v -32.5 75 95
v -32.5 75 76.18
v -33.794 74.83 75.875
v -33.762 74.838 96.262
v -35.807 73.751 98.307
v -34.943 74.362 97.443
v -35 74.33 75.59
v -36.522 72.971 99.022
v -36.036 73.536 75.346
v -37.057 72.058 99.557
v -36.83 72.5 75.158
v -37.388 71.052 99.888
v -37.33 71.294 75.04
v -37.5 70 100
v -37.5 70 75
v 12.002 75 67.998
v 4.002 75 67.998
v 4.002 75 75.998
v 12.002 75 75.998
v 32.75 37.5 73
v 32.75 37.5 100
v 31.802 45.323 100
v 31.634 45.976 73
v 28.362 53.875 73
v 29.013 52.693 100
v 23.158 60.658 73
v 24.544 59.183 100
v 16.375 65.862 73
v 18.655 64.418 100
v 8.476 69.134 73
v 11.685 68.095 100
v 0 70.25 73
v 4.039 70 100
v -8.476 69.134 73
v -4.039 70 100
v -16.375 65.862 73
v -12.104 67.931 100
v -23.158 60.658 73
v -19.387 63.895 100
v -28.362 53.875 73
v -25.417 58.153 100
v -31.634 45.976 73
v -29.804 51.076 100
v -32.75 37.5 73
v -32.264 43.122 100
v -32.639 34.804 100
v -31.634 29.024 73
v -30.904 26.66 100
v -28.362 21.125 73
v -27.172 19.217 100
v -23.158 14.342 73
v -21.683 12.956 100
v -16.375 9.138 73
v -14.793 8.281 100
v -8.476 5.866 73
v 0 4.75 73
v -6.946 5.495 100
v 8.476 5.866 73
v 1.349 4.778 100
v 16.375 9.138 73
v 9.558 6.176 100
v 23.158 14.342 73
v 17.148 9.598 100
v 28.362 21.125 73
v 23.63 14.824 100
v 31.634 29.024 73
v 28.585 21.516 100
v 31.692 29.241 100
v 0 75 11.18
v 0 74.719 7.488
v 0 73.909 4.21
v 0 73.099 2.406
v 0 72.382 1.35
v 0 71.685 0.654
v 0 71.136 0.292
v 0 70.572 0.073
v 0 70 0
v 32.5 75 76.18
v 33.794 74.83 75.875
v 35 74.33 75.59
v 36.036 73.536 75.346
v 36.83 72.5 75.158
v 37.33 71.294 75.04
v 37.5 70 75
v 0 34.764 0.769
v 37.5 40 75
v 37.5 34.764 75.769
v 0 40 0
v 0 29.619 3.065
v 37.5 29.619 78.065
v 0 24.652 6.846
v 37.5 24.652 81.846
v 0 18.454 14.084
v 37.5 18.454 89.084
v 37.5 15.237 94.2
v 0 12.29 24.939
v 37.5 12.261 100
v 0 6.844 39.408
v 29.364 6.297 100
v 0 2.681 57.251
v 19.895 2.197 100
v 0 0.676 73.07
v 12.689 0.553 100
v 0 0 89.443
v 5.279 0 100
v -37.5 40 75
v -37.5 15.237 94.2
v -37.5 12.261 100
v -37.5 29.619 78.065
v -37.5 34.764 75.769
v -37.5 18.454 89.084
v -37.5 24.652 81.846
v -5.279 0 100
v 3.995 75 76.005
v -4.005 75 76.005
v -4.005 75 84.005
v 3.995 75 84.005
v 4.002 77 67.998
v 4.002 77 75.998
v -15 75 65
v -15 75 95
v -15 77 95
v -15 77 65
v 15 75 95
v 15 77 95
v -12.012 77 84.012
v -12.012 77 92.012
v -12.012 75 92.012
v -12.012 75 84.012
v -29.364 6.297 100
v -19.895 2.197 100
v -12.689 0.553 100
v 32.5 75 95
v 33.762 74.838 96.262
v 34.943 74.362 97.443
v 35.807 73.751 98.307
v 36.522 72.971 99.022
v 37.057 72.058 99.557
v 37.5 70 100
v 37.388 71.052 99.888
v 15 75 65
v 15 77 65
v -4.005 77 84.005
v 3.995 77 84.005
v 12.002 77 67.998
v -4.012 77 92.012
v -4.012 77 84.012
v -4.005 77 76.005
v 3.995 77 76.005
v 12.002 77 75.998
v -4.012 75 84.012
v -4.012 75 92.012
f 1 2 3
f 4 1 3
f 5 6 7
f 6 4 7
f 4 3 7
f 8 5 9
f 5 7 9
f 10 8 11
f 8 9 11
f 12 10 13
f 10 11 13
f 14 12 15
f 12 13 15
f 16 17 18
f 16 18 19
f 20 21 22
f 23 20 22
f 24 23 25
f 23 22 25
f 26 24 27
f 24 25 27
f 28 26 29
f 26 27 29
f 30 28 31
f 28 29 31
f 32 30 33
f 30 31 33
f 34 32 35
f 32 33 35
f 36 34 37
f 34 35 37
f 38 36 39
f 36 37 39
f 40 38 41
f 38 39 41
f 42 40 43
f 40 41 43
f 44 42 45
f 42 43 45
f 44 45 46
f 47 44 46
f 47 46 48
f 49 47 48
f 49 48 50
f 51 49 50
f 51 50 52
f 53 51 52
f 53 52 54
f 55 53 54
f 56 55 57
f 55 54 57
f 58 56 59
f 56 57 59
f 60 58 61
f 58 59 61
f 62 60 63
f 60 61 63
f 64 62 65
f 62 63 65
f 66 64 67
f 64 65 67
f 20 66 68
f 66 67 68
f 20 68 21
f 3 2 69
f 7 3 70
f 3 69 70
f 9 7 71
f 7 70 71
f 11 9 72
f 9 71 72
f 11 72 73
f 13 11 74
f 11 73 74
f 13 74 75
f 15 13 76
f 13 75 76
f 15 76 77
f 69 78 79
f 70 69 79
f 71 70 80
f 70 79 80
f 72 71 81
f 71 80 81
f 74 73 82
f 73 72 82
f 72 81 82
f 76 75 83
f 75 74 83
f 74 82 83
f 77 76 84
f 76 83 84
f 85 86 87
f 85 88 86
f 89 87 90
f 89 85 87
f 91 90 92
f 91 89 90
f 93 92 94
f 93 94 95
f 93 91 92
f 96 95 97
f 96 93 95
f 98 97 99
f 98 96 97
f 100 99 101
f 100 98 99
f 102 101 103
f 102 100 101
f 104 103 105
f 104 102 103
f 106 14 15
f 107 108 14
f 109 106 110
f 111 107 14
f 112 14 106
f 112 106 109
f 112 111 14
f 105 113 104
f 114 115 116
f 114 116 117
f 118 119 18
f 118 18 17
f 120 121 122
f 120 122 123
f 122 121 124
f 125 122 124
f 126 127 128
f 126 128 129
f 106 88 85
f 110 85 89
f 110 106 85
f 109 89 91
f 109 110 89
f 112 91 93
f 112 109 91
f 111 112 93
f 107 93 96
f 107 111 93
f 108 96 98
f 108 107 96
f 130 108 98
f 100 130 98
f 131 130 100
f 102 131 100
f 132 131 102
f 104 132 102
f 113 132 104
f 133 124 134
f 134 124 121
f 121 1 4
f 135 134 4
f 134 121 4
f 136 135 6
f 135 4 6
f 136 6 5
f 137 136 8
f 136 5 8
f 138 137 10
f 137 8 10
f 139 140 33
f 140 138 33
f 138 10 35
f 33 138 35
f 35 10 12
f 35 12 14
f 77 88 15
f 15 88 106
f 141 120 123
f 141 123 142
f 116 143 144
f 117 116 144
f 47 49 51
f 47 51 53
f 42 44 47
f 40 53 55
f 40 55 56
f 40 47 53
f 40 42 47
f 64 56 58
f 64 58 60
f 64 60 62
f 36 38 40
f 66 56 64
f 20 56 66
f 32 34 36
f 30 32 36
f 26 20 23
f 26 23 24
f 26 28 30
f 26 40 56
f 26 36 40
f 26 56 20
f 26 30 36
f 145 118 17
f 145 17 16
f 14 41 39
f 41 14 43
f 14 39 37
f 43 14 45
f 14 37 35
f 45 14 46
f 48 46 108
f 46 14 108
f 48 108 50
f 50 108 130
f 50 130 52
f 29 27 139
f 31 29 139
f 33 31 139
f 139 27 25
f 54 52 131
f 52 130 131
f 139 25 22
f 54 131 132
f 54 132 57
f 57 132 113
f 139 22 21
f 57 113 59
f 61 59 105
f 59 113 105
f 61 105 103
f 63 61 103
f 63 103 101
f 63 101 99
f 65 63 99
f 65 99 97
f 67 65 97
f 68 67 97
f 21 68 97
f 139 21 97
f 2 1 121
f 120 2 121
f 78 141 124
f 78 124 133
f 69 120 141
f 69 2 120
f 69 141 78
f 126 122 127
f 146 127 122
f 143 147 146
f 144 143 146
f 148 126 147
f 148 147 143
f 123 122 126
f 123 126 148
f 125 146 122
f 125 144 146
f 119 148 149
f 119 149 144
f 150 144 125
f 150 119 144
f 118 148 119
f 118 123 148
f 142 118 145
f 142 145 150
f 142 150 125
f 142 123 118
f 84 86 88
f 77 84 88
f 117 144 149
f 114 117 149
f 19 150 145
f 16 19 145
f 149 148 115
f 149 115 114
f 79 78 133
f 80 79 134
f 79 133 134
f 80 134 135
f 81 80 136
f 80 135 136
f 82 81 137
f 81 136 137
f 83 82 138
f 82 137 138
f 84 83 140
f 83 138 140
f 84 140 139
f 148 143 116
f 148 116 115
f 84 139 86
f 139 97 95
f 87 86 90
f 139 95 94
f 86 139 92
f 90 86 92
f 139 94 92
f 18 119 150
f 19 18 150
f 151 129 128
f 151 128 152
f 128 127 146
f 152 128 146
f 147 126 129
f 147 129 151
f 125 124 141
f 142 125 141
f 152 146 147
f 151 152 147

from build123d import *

# Parameters (mm, degrees)
CROQUIS1_W              = 37.5
CROQUIS1_H              = 25
SALIENTE_EXTRUIR1_DEPTH = 75
CROQUIS3_R              = 32.75
CORTAR_EXTRUIR2_DEPTH   = 27
REDONDEO4_R             = 40
REDONDEO5_R             = 5
CROQUIS4_W              = 30
CROQUIS4_H              = 30
SALIENTE_EXTRUIR2_DEPTH = 2
CROQUIS5_W              = 8
CROQUIS5_H              = 8
CORTAR_EXTRUIR10_DEPTH  = 2


with BuildPart() as part:
    # Croquis1 → Saliente-Extruir1 (new body)
    with BuildSketch(Plane(origin=(0, 0, 0), x_dir=(1, 0, 0), z_dir=(0, 1, 0))):
        Polygon((0, 0), (-37.5, -75), (0, -75), align=None)
        Polygon((37.5, -75), (0, 0), (0, -75), align=None)
        with Locations((18.75, -87.5)):
            Rectangle(CROQUIS1_W, CROQUIS1_H)
        with Locations((-18.75, -87.5)):
            Rectangle(CROQUIS1_W, CROQUIS1_H)
    extrude(amount=SALIENTE_EXTRUIR1_DEPTH)

    # Croquis3 → Cortar-Extruir2 (cut)
    with BuildSketch(Plane.XY.offset(100)):
        with Locations((0, 37.5)):
            Circle(CROQUIS3_R)
    extrude(amount=-CORTAR_EXTRUIR2_DEPTH, mode=Mode.SUBTRACT)

    # Redondeo4
    redondeo4_edges = [part.edges().sort_by_distance(p)[0] for p in [
        (-18.75, 0, 37.5),
        (18.75, 0, 37.5),
    ]]
    fillet(redondeo4_edges, radius=REDONDEO4_R)

    # Redondeo5
    # the kernel refuses this fillet: 5 mm, written as the material it takes off along each edge
    with BuildSketch(Plane(origin=(37.5, 75, 112.5), x_dir=(-1, 0, 0), z_dir=(0, 0, -1)), Plane(origin=(-37.5, 75, 62.5), x_dir=(1, 0, 0), z_dir=(0, 0, 1))) as redondeo5_piece_1:
        with BuildLine():
            CenterArc((REDONDEO5_R, -REDONDEO5_R), REDONDEO5_R, 90, 90)
            Line((0, -REDONDEO5_R), (0, 0))
            Line((0, 0), (REDONDEO5_R, 0))
        make_face()
    extrude(amount=50, mode=Mode.SUBTRACT)
    with BuildSketch(Plane(origin=(43.090169944, 75, 86.180339887), x_dir=(0, -1, 0), z_dir=(-0.4472135954999581, 0, -0.8944271909999159)), Plane(origin=(5.590169944, 75, -11.180339887), x_dir=(0, -1, 0), z_dir=(-0.44721359549995776, 0, 0.894427190999916))) as redondeo5_piece_2:
        with BuildLine():
            CenterArc((REDONDEO5_R, REDONDEO5_R), REDONDEO5_R, 180, 90)
            Line((0, REDONDEO5_R), (0, 0))
            Line((0, 0), (REDONDEO5_R, 0))
        make_face()
    extrude(amount=108.852549156, mode=Mode.SUBTRACT)
    with BuildSketch(Plane(origin=(-50, 75, 100), x_dir=(0, 0, -1), z_dir=(1, 0, 0))) as redondeo5_piece_3:
        with BuildLine():
            CenterArc((REDONDEO5_R, -REDONDEO5_R), REDONDEO5_R, 90, 90)
            Line((0, -REDONDEO5_R), (0, 0))
            Line((0, 0), (REDONDEO5_R, 0))
        make_face()
    extrude(amount=100, mode=Mode.SUBTRACT)

    # Croquis4 → Saliente-Extruir2 (add)
    with BuildSketch(Plane(origin=(0, 75, 0), x_dir=(1, 0, 0), z_dir=(0, 1, 0))):
        with Locations((0, -80)):
            Rectangle(CROQUIS4_W, CROQUIS4_H)
    extrude(amount=SALIENTE_EXTRUIR2_DEPTH)

    # Croquis5 → Cortar-Extruir10 (cut)
    with BuildSketch(Plane(origin=(0, 77, 0), x_dir=(1, 0, 0), z_dir=(0, 1, 0))):
        with Locations((-8.012274888, -88.012274888)):
            Rectangle(CROQUIS5_W, CROQUIS5_H)
        with Locations((8.001867248, -71.998132752)):
            Rectangle(CROQUIS5_W, CROQUIS5_H)
        with Locations((-0.00520382, -80.00520382)):
            Rectangle(CROQUIS5_W, CROQUIS5_H)
    extrude(amount=-CORTAR_EXTRUIR10_DEPTH, mode=Mode.SUBTRACT)


solid = part.part
